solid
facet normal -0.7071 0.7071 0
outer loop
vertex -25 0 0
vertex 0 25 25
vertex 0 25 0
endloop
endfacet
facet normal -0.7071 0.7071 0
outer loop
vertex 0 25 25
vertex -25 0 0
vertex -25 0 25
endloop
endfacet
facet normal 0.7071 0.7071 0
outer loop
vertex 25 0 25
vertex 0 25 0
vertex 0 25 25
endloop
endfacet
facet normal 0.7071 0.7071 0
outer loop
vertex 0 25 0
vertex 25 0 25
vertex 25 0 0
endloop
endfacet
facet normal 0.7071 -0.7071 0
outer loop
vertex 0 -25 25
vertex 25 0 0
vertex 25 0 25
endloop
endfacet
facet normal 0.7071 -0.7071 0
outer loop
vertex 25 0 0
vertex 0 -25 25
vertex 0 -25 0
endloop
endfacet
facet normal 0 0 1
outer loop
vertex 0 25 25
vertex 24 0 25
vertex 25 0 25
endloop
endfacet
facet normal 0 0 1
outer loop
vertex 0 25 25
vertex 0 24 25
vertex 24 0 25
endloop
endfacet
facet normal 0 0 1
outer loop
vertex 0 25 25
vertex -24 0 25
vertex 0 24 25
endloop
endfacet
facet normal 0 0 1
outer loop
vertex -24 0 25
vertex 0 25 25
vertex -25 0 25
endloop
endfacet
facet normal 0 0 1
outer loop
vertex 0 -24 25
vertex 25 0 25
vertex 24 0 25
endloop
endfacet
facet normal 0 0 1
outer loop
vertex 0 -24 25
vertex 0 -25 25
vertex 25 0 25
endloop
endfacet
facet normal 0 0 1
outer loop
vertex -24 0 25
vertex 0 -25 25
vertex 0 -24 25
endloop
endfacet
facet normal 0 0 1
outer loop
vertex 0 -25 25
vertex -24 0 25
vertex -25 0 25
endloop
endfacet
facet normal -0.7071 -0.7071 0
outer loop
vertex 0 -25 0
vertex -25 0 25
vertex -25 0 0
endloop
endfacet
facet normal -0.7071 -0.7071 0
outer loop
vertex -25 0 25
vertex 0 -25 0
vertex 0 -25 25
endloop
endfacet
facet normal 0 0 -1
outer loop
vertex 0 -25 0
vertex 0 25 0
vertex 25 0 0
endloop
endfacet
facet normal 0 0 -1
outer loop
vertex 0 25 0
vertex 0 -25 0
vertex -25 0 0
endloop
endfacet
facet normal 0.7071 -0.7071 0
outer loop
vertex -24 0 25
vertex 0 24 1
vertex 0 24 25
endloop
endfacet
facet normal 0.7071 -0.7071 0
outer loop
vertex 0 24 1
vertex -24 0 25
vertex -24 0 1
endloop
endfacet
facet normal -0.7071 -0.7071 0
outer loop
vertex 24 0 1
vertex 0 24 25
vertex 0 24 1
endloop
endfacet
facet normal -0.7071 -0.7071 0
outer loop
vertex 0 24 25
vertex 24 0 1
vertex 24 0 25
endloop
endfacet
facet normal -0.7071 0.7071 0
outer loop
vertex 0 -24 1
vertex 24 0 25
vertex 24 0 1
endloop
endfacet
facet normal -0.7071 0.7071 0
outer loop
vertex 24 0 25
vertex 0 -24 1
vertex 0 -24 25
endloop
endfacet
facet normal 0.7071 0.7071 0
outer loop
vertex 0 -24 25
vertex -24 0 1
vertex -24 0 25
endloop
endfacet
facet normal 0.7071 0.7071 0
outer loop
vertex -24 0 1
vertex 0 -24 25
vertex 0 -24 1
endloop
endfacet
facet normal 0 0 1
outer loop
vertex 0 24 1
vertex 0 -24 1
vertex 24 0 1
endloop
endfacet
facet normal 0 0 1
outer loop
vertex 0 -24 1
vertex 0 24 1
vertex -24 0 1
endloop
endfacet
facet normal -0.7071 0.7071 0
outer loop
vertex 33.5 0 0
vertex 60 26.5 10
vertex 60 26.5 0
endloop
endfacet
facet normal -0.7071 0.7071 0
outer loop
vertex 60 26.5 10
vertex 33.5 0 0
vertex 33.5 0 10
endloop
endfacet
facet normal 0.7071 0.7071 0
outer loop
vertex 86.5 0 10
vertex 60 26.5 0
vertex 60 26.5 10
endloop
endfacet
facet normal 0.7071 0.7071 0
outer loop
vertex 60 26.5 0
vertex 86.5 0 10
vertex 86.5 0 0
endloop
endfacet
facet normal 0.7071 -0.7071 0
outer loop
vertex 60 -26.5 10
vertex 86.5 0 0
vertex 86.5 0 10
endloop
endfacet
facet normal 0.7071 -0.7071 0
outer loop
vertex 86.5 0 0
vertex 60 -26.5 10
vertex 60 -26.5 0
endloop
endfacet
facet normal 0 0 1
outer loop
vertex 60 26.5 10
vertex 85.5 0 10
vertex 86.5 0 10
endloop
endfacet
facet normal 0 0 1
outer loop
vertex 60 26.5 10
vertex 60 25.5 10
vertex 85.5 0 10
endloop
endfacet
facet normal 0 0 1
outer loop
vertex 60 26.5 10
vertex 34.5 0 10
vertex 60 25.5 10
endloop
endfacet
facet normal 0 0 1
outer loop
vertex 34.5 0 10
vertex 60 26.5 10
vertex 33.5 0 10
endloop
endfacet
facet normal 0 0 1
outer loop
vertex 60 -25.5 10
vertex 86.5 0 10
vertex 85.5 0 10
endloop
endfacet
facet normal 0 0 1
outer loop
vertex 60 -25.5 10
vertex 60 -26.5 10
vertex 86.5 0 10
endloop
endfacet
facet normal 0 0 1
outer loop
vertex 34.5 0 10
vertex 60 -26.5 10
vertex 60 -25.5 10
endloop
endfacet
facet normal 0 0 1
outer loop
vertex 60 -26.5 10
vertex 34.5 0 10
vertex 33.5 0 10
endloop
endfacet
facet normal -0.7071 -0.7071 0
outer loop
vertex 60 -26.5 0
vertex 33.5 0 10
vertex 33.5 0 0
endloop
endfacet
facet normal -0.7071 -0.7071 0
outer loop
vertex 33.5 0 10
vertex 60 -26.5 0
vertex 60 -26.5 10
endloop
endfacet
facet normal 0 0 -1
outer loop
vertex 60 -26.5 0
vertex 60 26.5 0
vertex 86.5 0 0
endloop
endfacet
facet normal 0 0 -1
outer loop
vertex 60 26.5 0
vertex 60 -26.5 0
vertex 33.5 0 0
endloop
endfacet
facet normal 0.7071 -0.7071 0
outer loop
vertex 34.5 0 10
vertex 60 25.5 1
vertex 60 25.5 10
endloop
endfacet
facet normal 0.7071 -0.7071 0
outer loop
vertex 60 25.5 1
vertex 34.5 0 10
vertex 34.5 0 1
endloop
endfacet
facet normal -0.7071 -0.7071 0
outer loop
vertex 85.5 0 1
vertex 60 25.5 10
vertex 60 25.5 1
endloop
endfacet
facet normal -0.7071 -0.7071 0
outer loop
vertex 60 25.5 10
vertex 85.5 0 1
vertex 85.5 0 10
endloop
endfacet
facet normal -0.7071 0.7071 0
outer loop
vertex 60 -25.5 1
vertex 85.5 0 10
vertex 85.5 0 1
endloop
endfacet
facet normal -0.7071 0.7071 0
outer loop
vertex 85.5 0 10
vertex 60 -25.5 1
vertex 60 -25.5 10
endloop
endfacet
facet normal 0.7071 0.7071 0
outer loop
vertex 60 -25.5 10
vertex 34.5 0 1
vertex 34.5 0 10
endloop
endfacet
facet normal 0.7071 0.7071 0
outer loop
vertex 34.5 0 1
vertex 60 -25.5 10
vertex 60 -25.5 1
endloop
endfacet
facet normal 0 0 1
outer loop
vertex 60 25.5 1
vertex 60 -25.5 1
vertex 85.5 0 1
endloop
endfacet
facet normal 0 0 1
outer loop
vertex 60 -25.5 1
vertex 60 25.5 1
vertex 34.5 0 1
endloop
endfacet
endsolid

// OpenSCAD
//Parameterised N sided box
// Glyn Cowles July 2014


//Thickness of sides
thickness=1;//[1:10] 
//Outside diameter of box
diam=50;//[10:200]   
//Height of box
boxh=25;//[5:150]   
//Height of lid
lidh=10;//[3:20]
//Looseness factor of lid
looseness=10;//[0:20]
//Number of sides
sides=4;//[3:60]

$fn=sides;
loose=looseness/10; // id looseness = 5 loose =0.5

assemble(); 

//-----------------------------------------------------------------------
module tube(d,h,th) {
rad=d/2;
difference() {
cylinder(h=h,r=rad);
cylinder(h=h,r=rad-th);
}
}
//-----------------------------------------------------------------------
module box() {
union(){
	tube(diam,boxh,thickness);
	#tube(diam,thickness,diam);
}
}
//-----------------------------------------------------------------------

module lid(){
union() {
	tube(diam+thickness*2+loose,lidh,thickness);
	#tube(diam+thickness*2+loose,thickness,diam+thickness*2+loose);
 }
}
//-----------------------------------------------------------------------
module assemble() {
box();
translate([diam+10,0,0]) lid();
};
